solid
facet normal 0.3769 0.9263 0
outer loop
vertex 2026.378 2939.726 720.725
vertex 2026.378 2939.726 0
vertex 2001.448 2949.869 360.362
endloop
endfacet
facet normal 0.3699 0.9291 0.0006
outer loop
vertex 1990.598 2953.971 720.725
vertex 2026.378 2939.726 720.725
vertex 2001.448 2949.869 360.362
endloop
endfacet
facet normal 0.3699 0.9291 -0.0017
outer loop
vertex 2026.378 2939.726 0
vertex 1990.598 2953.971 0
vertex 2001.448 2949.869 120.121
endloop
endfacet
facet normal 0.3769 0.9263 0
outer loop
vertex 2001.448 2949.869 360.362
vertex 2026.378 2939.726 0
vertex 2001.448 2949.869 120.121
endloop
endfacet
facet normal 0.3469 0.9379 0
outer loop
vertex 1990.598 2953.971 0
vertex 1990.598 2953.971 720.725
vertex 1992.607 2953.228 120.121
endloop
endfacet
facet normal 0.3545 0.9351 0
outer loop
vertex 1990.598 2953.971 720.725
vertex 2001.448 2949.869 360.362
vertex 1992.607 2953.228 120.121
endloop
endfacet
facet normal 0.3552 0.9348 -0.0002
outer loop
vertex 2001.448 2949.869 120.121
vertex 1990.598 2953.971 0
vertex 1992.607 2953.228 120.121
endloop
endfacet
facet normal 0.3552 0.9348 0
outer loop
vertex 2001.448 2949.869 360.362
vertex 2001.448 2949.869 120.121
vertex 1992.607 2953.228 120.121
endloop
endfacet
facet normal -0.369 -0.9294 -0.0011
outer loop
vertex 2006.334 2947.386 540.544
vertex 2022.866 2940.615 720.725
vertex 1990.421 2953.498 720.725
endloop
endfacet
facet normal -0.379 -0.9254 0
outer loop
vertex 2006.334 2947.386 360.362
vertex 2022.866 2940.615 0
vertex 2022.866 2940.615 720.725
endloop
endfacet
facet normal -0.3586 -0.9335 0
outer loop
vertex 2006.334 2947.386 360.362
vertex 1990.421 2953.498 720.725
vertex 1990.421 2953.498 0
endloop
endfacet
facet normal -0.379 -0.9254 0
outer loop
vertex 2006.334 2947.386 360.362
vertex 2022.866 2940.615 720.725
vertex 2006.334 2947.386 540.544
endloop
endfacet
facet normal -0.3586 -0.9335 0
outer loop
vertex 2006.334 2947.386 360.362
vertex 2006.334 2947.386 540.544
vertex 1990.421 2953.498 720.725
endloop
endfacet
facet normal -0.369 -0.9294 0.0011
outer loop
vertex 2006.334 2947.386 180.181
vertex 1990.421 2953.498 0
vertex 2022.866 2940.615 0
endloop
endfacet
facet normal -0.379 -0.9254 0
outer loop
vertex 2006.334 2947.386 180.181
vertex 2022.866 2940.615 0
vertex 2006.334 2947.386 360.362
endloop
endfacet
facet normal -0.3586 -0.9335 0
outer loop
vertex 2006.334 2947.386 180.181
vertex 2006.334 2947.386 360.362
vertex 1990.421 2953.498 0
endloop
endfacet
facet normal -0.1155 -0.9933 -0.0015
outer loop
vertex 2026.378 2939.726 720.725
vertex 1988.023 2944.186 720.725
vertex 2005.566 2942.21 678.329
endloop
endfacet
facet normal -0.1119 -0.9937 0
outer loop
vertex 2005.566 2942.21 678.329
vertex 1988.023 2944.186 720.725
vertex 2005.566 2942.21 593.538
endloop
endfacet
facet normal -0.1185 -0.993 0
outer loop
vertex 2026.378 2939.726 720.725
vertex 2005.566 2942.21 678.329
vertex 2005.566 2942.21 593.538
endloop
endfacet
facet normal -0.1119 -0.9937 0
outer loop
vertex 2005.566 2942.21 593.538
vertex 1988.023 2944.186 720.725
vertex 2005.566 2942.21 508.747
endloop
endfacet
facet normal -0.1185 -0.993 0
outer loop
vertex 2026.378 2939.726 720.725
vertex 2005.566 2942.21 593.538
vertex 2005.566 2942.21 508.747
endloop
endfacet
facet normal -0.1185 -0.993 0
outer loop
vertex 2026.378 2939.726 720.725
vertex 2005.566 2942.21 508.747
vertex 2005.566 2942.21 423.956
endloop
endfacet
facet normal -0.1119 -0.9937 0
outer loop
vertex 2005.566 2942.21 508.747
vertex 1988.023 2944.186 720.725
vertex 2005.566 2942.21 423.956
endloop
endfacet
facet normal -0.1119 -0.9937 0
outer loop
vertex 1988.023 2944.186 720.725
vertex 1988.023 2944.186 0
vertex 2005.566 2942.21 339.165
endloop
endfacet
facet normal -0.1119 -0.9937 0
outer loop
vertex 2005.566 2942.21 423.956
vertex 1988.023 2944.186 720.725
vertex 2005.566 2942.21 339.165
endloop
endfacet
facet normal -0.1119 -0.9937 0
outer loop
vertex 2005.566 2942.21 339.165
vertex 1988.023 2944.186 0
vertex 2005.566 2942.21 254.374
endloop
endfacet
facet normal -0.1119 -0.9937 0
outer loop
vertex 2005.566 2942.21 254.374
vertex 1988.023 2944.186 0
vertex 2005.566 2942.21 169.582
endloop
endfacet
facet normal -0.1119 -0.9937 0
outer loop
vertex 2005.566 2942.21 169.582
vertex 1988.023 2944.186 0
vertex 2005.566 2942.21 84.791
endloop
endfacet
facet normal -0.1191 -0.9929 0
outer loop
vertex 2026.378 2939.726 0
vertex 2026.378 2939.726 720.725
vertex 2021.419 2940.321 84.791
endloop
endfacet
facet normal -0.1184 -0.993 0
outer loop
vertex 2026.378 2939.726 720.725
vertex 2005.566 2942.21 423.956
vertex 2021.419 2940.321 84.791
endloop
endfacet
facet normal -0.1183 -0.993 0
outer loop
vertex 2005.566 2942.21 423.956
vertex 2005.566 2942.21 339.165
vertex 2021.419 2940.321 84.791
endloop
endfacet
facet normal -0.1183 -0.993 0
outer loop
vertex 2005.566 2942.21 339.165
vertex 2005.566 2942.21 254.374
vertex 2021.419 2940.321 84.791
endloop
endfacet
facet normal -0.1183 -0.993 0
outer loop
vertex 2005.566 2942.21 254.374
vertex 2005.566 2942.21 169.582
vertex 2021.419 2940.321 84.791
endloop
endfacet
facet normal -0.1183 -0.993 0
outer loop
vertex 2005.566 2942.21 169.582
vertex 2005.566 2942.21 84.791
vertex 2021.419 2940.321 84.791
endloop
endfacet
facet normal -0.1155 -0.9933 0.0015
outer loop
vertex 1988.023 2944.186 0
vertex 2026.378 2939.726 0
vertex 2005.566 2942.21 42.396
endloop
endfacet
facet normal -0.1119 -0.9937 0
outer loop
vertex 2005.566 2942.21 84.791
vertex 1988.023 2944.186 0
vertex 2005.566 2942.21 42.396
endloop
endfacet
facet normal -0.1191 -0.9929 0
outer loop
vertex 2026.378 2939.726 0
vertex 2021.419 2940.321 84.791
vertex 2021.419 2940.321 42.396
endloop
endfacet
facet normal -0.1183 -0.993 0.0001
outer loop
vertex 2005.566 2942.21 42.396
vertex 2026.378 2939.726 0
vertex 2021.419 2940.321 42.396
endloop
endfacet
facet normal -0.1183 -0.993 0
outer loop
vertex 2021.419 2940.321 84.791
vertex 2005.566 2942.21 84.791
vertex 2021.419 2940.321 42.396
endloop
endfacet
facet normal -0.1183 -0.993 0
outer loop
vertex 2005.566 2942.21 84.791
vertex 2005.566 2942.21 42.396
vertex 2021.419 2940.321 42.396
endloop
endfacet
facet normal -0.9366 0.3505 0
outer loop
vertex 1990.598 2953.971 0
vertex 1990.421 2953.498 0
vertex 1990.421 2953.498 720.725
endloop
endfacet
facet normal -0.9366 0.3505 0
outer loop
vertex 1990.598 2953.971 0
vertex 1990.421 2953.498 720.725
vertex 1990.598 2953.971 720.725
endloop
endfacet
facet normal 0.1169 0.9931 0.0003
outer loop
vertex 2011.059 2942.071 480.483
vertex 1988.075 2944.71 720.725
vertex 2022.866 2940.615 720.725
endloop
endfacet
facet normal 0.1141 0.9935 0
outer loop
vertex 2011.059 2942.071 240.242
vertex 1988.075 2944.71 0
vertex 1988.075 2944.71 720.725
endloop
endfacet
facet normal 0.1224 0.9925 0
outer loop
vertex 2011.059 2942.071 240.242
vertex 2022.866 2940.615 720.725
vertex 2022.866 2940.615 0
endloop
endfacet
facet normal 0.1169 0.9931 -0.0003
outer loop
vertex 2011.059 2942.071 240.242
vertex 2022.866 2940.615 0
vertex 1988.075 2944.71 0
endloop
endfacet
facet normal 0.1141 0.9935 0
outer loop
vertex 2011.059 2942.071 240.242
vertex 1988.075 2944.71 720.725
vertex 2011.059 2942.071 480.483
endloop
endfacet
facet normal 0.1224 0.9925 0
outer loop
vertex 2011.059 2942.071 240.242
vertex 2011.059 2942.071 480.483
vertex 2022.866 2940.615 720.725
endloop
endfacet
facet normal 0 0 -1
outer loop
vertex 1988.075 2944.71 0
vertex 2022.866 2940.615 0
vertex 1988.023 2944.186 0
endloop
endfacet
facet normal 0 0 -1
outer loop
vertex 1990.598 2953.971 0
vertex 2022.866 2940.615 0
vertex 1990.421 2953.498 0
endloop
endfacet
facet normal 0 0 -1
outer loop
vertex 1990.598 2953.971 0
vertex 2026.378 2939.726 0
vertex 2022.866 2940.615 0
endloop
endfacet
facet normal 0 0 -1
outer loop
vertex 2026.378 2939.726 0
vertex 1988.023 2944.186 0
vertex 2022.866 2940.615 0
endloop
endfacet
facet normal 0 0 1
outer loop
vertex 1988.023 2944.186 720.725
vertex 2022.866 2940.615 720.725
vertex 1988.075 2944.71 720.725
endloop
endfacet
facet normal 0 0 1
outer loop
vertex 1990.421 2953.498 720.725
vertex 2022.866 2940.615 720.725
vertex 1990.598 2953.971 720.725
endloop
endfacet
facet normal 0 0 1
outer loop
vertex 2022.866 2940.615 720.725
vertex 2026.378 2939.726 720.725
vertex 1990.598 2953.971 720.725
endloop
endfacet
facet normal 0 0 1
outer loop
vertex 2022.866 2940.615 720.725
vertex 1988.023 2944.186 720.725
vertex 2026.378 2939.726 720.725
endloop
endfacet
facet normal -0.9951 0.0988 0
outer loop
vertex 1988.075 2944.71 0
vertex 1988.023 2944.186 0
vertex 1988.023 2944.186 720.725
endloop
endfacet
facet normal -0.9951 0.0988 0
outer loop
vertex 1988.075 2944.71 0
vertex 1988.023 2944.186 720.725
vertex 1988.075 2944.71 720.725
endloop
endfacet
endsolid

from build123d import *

# Parameters (mm, degrees)
BOSS_EXTRUDE1_DEPTH = 720.725


with BuildPart() as part:
    # Sketch2 → Boss-Extrude1 (new body)
    with BuildSketch(Plane.XY):
        with BuildLine():
            Line((1990.421486693, 2953.497553429), (1990.598028741, 2953.970958412))
            add(Edge.make_bspline(
                [(2026.378123223, 2939.726019749), (2025.772367033, 2939.966817705), (2025.167001193, 2940.208065776), (2024.563270161, 2940.45119895), (2024.252449888, 2940.576371776), (2023.942062924, 2940.702044254), (2023.632279085, 2940.828412198), (2019.922907303, 2942.341550154), (2016.300010508, 2943.954402829), (2008.840382128, 2946.884862912), (2005.182046354, 2948.446003317), (1998.49830219, 2950.992561795), (1995.575349012, 2952.143708473), (1991.935867823, 2953.473628662), (1991.266522782, 2953.72164072), (1990.598028741, 2953.970958412)],
                knots=[0.099020879, 0.099020879, 0.099020879, 0.099020879, 0.175577174, 0.175577174, 0.175577174, 0.214990832, 0.214990832, 0.214990832, 0.686932531, 0.686932531, 1.158874229, 1.158874229, 1.531655023, 1.531655023, 1.615895701, 1.615895701, 1.615895701, 1.615895701], degree=3))
            add(Edge.make_bspline(
                [(1988.02305883, 2944.185998102), (1988.486093696, 2944.140440591), (1990.118619768, 2943.977588834), (1992.878565386, 2943.651927789), (1996.260561822, 2943.27824299), (1999.50276369, 2942.881360992), (2002.595054506, 2942.588170362), (2005.514279258, 2942.198699316), (2008.286301016, 2941.928612986), (2010.885526485, 2941.569057415), (2013.333900984, 2941.299836639), (2015.607898689, 2941.033281035), (2017.705847242, 2940.755050343), (2019.629402987, 2940.578518098), (2021.367662073, 2940.314827517), (2022.931203684, 2940.147471412), (2024.319748194, 2939.977883581), (2025.440549175, 2939.811318081), (2026.113682533, 2939.755557142), (2026.378123223, 2939.726019749)],
                knots=[28.432980691, 28.432980691, 28.432980691, 28.432980691, 28.487933475, 28.626756368, 28.761203264, 28.889815923, 29.012534113, 29.128021866, 29.237609431, 29.341433808, 29.437893302, 29.528519208, 29.611854391, 29.687830524, 29.756590169, 29.81943804, 29.873536901, 29.921805305, 29.953240386, 29.953240386, 29.953240386, 29.953240386], degree=3))
            Line((1988.02305883, 2944.185998102), (1988.074605977, 2944.709910093))
            add(Edge.make_bspline(
                [(1988.074605977, 2944.709910093), (1989.230150517, 2944.58289678), (1990.385621975, 2944.45341125), (1998.052162808, 2943.575786345), (2004.595655519, 2942.866835827), (2014.99093127, 2941.587524984), (2018.884584402, 2941.067615831), (2022.866460843, 2940.614570977)],
                knots=[28.432746502, 28.432746502, 28.432746502, 28.432746502, 28.569989508, 28.569989508, 29.343340852, 29.343340852, 29.81381441, 29.81381441, 29.81381441, 29.81381441], degree=3))
            add(Edge.make_bspline(
                [(2022.866460843, 2940.614570977), (2021.798028907, 2941.061512065), (2020.716308213, 2941.506999086), (2015.217323697, 2943.787839229), (2010.802115728, 2945.575588777), (2001.866334932, 2949.196830335), (1997.44616335, 2950.892375156), (1992.11061417, 2952.870832924), (1991.266086469, 2953.18432728), (1990.421486693, 2953.497553429)],
                knots=[0.240373092, 0.240373092, 0.240373092, 0.240373092, 0.376824745, 0.376824745, 0.94322841, 0.94322841, 1.509632074, 1.509632074, 1.616176715, 1.616176715, 1.616176715, 1.616176715], degree=3))
        make_face()
    extrude(amount=BOSS_EXTRUDE1_DEPTH)


solid = part.part
